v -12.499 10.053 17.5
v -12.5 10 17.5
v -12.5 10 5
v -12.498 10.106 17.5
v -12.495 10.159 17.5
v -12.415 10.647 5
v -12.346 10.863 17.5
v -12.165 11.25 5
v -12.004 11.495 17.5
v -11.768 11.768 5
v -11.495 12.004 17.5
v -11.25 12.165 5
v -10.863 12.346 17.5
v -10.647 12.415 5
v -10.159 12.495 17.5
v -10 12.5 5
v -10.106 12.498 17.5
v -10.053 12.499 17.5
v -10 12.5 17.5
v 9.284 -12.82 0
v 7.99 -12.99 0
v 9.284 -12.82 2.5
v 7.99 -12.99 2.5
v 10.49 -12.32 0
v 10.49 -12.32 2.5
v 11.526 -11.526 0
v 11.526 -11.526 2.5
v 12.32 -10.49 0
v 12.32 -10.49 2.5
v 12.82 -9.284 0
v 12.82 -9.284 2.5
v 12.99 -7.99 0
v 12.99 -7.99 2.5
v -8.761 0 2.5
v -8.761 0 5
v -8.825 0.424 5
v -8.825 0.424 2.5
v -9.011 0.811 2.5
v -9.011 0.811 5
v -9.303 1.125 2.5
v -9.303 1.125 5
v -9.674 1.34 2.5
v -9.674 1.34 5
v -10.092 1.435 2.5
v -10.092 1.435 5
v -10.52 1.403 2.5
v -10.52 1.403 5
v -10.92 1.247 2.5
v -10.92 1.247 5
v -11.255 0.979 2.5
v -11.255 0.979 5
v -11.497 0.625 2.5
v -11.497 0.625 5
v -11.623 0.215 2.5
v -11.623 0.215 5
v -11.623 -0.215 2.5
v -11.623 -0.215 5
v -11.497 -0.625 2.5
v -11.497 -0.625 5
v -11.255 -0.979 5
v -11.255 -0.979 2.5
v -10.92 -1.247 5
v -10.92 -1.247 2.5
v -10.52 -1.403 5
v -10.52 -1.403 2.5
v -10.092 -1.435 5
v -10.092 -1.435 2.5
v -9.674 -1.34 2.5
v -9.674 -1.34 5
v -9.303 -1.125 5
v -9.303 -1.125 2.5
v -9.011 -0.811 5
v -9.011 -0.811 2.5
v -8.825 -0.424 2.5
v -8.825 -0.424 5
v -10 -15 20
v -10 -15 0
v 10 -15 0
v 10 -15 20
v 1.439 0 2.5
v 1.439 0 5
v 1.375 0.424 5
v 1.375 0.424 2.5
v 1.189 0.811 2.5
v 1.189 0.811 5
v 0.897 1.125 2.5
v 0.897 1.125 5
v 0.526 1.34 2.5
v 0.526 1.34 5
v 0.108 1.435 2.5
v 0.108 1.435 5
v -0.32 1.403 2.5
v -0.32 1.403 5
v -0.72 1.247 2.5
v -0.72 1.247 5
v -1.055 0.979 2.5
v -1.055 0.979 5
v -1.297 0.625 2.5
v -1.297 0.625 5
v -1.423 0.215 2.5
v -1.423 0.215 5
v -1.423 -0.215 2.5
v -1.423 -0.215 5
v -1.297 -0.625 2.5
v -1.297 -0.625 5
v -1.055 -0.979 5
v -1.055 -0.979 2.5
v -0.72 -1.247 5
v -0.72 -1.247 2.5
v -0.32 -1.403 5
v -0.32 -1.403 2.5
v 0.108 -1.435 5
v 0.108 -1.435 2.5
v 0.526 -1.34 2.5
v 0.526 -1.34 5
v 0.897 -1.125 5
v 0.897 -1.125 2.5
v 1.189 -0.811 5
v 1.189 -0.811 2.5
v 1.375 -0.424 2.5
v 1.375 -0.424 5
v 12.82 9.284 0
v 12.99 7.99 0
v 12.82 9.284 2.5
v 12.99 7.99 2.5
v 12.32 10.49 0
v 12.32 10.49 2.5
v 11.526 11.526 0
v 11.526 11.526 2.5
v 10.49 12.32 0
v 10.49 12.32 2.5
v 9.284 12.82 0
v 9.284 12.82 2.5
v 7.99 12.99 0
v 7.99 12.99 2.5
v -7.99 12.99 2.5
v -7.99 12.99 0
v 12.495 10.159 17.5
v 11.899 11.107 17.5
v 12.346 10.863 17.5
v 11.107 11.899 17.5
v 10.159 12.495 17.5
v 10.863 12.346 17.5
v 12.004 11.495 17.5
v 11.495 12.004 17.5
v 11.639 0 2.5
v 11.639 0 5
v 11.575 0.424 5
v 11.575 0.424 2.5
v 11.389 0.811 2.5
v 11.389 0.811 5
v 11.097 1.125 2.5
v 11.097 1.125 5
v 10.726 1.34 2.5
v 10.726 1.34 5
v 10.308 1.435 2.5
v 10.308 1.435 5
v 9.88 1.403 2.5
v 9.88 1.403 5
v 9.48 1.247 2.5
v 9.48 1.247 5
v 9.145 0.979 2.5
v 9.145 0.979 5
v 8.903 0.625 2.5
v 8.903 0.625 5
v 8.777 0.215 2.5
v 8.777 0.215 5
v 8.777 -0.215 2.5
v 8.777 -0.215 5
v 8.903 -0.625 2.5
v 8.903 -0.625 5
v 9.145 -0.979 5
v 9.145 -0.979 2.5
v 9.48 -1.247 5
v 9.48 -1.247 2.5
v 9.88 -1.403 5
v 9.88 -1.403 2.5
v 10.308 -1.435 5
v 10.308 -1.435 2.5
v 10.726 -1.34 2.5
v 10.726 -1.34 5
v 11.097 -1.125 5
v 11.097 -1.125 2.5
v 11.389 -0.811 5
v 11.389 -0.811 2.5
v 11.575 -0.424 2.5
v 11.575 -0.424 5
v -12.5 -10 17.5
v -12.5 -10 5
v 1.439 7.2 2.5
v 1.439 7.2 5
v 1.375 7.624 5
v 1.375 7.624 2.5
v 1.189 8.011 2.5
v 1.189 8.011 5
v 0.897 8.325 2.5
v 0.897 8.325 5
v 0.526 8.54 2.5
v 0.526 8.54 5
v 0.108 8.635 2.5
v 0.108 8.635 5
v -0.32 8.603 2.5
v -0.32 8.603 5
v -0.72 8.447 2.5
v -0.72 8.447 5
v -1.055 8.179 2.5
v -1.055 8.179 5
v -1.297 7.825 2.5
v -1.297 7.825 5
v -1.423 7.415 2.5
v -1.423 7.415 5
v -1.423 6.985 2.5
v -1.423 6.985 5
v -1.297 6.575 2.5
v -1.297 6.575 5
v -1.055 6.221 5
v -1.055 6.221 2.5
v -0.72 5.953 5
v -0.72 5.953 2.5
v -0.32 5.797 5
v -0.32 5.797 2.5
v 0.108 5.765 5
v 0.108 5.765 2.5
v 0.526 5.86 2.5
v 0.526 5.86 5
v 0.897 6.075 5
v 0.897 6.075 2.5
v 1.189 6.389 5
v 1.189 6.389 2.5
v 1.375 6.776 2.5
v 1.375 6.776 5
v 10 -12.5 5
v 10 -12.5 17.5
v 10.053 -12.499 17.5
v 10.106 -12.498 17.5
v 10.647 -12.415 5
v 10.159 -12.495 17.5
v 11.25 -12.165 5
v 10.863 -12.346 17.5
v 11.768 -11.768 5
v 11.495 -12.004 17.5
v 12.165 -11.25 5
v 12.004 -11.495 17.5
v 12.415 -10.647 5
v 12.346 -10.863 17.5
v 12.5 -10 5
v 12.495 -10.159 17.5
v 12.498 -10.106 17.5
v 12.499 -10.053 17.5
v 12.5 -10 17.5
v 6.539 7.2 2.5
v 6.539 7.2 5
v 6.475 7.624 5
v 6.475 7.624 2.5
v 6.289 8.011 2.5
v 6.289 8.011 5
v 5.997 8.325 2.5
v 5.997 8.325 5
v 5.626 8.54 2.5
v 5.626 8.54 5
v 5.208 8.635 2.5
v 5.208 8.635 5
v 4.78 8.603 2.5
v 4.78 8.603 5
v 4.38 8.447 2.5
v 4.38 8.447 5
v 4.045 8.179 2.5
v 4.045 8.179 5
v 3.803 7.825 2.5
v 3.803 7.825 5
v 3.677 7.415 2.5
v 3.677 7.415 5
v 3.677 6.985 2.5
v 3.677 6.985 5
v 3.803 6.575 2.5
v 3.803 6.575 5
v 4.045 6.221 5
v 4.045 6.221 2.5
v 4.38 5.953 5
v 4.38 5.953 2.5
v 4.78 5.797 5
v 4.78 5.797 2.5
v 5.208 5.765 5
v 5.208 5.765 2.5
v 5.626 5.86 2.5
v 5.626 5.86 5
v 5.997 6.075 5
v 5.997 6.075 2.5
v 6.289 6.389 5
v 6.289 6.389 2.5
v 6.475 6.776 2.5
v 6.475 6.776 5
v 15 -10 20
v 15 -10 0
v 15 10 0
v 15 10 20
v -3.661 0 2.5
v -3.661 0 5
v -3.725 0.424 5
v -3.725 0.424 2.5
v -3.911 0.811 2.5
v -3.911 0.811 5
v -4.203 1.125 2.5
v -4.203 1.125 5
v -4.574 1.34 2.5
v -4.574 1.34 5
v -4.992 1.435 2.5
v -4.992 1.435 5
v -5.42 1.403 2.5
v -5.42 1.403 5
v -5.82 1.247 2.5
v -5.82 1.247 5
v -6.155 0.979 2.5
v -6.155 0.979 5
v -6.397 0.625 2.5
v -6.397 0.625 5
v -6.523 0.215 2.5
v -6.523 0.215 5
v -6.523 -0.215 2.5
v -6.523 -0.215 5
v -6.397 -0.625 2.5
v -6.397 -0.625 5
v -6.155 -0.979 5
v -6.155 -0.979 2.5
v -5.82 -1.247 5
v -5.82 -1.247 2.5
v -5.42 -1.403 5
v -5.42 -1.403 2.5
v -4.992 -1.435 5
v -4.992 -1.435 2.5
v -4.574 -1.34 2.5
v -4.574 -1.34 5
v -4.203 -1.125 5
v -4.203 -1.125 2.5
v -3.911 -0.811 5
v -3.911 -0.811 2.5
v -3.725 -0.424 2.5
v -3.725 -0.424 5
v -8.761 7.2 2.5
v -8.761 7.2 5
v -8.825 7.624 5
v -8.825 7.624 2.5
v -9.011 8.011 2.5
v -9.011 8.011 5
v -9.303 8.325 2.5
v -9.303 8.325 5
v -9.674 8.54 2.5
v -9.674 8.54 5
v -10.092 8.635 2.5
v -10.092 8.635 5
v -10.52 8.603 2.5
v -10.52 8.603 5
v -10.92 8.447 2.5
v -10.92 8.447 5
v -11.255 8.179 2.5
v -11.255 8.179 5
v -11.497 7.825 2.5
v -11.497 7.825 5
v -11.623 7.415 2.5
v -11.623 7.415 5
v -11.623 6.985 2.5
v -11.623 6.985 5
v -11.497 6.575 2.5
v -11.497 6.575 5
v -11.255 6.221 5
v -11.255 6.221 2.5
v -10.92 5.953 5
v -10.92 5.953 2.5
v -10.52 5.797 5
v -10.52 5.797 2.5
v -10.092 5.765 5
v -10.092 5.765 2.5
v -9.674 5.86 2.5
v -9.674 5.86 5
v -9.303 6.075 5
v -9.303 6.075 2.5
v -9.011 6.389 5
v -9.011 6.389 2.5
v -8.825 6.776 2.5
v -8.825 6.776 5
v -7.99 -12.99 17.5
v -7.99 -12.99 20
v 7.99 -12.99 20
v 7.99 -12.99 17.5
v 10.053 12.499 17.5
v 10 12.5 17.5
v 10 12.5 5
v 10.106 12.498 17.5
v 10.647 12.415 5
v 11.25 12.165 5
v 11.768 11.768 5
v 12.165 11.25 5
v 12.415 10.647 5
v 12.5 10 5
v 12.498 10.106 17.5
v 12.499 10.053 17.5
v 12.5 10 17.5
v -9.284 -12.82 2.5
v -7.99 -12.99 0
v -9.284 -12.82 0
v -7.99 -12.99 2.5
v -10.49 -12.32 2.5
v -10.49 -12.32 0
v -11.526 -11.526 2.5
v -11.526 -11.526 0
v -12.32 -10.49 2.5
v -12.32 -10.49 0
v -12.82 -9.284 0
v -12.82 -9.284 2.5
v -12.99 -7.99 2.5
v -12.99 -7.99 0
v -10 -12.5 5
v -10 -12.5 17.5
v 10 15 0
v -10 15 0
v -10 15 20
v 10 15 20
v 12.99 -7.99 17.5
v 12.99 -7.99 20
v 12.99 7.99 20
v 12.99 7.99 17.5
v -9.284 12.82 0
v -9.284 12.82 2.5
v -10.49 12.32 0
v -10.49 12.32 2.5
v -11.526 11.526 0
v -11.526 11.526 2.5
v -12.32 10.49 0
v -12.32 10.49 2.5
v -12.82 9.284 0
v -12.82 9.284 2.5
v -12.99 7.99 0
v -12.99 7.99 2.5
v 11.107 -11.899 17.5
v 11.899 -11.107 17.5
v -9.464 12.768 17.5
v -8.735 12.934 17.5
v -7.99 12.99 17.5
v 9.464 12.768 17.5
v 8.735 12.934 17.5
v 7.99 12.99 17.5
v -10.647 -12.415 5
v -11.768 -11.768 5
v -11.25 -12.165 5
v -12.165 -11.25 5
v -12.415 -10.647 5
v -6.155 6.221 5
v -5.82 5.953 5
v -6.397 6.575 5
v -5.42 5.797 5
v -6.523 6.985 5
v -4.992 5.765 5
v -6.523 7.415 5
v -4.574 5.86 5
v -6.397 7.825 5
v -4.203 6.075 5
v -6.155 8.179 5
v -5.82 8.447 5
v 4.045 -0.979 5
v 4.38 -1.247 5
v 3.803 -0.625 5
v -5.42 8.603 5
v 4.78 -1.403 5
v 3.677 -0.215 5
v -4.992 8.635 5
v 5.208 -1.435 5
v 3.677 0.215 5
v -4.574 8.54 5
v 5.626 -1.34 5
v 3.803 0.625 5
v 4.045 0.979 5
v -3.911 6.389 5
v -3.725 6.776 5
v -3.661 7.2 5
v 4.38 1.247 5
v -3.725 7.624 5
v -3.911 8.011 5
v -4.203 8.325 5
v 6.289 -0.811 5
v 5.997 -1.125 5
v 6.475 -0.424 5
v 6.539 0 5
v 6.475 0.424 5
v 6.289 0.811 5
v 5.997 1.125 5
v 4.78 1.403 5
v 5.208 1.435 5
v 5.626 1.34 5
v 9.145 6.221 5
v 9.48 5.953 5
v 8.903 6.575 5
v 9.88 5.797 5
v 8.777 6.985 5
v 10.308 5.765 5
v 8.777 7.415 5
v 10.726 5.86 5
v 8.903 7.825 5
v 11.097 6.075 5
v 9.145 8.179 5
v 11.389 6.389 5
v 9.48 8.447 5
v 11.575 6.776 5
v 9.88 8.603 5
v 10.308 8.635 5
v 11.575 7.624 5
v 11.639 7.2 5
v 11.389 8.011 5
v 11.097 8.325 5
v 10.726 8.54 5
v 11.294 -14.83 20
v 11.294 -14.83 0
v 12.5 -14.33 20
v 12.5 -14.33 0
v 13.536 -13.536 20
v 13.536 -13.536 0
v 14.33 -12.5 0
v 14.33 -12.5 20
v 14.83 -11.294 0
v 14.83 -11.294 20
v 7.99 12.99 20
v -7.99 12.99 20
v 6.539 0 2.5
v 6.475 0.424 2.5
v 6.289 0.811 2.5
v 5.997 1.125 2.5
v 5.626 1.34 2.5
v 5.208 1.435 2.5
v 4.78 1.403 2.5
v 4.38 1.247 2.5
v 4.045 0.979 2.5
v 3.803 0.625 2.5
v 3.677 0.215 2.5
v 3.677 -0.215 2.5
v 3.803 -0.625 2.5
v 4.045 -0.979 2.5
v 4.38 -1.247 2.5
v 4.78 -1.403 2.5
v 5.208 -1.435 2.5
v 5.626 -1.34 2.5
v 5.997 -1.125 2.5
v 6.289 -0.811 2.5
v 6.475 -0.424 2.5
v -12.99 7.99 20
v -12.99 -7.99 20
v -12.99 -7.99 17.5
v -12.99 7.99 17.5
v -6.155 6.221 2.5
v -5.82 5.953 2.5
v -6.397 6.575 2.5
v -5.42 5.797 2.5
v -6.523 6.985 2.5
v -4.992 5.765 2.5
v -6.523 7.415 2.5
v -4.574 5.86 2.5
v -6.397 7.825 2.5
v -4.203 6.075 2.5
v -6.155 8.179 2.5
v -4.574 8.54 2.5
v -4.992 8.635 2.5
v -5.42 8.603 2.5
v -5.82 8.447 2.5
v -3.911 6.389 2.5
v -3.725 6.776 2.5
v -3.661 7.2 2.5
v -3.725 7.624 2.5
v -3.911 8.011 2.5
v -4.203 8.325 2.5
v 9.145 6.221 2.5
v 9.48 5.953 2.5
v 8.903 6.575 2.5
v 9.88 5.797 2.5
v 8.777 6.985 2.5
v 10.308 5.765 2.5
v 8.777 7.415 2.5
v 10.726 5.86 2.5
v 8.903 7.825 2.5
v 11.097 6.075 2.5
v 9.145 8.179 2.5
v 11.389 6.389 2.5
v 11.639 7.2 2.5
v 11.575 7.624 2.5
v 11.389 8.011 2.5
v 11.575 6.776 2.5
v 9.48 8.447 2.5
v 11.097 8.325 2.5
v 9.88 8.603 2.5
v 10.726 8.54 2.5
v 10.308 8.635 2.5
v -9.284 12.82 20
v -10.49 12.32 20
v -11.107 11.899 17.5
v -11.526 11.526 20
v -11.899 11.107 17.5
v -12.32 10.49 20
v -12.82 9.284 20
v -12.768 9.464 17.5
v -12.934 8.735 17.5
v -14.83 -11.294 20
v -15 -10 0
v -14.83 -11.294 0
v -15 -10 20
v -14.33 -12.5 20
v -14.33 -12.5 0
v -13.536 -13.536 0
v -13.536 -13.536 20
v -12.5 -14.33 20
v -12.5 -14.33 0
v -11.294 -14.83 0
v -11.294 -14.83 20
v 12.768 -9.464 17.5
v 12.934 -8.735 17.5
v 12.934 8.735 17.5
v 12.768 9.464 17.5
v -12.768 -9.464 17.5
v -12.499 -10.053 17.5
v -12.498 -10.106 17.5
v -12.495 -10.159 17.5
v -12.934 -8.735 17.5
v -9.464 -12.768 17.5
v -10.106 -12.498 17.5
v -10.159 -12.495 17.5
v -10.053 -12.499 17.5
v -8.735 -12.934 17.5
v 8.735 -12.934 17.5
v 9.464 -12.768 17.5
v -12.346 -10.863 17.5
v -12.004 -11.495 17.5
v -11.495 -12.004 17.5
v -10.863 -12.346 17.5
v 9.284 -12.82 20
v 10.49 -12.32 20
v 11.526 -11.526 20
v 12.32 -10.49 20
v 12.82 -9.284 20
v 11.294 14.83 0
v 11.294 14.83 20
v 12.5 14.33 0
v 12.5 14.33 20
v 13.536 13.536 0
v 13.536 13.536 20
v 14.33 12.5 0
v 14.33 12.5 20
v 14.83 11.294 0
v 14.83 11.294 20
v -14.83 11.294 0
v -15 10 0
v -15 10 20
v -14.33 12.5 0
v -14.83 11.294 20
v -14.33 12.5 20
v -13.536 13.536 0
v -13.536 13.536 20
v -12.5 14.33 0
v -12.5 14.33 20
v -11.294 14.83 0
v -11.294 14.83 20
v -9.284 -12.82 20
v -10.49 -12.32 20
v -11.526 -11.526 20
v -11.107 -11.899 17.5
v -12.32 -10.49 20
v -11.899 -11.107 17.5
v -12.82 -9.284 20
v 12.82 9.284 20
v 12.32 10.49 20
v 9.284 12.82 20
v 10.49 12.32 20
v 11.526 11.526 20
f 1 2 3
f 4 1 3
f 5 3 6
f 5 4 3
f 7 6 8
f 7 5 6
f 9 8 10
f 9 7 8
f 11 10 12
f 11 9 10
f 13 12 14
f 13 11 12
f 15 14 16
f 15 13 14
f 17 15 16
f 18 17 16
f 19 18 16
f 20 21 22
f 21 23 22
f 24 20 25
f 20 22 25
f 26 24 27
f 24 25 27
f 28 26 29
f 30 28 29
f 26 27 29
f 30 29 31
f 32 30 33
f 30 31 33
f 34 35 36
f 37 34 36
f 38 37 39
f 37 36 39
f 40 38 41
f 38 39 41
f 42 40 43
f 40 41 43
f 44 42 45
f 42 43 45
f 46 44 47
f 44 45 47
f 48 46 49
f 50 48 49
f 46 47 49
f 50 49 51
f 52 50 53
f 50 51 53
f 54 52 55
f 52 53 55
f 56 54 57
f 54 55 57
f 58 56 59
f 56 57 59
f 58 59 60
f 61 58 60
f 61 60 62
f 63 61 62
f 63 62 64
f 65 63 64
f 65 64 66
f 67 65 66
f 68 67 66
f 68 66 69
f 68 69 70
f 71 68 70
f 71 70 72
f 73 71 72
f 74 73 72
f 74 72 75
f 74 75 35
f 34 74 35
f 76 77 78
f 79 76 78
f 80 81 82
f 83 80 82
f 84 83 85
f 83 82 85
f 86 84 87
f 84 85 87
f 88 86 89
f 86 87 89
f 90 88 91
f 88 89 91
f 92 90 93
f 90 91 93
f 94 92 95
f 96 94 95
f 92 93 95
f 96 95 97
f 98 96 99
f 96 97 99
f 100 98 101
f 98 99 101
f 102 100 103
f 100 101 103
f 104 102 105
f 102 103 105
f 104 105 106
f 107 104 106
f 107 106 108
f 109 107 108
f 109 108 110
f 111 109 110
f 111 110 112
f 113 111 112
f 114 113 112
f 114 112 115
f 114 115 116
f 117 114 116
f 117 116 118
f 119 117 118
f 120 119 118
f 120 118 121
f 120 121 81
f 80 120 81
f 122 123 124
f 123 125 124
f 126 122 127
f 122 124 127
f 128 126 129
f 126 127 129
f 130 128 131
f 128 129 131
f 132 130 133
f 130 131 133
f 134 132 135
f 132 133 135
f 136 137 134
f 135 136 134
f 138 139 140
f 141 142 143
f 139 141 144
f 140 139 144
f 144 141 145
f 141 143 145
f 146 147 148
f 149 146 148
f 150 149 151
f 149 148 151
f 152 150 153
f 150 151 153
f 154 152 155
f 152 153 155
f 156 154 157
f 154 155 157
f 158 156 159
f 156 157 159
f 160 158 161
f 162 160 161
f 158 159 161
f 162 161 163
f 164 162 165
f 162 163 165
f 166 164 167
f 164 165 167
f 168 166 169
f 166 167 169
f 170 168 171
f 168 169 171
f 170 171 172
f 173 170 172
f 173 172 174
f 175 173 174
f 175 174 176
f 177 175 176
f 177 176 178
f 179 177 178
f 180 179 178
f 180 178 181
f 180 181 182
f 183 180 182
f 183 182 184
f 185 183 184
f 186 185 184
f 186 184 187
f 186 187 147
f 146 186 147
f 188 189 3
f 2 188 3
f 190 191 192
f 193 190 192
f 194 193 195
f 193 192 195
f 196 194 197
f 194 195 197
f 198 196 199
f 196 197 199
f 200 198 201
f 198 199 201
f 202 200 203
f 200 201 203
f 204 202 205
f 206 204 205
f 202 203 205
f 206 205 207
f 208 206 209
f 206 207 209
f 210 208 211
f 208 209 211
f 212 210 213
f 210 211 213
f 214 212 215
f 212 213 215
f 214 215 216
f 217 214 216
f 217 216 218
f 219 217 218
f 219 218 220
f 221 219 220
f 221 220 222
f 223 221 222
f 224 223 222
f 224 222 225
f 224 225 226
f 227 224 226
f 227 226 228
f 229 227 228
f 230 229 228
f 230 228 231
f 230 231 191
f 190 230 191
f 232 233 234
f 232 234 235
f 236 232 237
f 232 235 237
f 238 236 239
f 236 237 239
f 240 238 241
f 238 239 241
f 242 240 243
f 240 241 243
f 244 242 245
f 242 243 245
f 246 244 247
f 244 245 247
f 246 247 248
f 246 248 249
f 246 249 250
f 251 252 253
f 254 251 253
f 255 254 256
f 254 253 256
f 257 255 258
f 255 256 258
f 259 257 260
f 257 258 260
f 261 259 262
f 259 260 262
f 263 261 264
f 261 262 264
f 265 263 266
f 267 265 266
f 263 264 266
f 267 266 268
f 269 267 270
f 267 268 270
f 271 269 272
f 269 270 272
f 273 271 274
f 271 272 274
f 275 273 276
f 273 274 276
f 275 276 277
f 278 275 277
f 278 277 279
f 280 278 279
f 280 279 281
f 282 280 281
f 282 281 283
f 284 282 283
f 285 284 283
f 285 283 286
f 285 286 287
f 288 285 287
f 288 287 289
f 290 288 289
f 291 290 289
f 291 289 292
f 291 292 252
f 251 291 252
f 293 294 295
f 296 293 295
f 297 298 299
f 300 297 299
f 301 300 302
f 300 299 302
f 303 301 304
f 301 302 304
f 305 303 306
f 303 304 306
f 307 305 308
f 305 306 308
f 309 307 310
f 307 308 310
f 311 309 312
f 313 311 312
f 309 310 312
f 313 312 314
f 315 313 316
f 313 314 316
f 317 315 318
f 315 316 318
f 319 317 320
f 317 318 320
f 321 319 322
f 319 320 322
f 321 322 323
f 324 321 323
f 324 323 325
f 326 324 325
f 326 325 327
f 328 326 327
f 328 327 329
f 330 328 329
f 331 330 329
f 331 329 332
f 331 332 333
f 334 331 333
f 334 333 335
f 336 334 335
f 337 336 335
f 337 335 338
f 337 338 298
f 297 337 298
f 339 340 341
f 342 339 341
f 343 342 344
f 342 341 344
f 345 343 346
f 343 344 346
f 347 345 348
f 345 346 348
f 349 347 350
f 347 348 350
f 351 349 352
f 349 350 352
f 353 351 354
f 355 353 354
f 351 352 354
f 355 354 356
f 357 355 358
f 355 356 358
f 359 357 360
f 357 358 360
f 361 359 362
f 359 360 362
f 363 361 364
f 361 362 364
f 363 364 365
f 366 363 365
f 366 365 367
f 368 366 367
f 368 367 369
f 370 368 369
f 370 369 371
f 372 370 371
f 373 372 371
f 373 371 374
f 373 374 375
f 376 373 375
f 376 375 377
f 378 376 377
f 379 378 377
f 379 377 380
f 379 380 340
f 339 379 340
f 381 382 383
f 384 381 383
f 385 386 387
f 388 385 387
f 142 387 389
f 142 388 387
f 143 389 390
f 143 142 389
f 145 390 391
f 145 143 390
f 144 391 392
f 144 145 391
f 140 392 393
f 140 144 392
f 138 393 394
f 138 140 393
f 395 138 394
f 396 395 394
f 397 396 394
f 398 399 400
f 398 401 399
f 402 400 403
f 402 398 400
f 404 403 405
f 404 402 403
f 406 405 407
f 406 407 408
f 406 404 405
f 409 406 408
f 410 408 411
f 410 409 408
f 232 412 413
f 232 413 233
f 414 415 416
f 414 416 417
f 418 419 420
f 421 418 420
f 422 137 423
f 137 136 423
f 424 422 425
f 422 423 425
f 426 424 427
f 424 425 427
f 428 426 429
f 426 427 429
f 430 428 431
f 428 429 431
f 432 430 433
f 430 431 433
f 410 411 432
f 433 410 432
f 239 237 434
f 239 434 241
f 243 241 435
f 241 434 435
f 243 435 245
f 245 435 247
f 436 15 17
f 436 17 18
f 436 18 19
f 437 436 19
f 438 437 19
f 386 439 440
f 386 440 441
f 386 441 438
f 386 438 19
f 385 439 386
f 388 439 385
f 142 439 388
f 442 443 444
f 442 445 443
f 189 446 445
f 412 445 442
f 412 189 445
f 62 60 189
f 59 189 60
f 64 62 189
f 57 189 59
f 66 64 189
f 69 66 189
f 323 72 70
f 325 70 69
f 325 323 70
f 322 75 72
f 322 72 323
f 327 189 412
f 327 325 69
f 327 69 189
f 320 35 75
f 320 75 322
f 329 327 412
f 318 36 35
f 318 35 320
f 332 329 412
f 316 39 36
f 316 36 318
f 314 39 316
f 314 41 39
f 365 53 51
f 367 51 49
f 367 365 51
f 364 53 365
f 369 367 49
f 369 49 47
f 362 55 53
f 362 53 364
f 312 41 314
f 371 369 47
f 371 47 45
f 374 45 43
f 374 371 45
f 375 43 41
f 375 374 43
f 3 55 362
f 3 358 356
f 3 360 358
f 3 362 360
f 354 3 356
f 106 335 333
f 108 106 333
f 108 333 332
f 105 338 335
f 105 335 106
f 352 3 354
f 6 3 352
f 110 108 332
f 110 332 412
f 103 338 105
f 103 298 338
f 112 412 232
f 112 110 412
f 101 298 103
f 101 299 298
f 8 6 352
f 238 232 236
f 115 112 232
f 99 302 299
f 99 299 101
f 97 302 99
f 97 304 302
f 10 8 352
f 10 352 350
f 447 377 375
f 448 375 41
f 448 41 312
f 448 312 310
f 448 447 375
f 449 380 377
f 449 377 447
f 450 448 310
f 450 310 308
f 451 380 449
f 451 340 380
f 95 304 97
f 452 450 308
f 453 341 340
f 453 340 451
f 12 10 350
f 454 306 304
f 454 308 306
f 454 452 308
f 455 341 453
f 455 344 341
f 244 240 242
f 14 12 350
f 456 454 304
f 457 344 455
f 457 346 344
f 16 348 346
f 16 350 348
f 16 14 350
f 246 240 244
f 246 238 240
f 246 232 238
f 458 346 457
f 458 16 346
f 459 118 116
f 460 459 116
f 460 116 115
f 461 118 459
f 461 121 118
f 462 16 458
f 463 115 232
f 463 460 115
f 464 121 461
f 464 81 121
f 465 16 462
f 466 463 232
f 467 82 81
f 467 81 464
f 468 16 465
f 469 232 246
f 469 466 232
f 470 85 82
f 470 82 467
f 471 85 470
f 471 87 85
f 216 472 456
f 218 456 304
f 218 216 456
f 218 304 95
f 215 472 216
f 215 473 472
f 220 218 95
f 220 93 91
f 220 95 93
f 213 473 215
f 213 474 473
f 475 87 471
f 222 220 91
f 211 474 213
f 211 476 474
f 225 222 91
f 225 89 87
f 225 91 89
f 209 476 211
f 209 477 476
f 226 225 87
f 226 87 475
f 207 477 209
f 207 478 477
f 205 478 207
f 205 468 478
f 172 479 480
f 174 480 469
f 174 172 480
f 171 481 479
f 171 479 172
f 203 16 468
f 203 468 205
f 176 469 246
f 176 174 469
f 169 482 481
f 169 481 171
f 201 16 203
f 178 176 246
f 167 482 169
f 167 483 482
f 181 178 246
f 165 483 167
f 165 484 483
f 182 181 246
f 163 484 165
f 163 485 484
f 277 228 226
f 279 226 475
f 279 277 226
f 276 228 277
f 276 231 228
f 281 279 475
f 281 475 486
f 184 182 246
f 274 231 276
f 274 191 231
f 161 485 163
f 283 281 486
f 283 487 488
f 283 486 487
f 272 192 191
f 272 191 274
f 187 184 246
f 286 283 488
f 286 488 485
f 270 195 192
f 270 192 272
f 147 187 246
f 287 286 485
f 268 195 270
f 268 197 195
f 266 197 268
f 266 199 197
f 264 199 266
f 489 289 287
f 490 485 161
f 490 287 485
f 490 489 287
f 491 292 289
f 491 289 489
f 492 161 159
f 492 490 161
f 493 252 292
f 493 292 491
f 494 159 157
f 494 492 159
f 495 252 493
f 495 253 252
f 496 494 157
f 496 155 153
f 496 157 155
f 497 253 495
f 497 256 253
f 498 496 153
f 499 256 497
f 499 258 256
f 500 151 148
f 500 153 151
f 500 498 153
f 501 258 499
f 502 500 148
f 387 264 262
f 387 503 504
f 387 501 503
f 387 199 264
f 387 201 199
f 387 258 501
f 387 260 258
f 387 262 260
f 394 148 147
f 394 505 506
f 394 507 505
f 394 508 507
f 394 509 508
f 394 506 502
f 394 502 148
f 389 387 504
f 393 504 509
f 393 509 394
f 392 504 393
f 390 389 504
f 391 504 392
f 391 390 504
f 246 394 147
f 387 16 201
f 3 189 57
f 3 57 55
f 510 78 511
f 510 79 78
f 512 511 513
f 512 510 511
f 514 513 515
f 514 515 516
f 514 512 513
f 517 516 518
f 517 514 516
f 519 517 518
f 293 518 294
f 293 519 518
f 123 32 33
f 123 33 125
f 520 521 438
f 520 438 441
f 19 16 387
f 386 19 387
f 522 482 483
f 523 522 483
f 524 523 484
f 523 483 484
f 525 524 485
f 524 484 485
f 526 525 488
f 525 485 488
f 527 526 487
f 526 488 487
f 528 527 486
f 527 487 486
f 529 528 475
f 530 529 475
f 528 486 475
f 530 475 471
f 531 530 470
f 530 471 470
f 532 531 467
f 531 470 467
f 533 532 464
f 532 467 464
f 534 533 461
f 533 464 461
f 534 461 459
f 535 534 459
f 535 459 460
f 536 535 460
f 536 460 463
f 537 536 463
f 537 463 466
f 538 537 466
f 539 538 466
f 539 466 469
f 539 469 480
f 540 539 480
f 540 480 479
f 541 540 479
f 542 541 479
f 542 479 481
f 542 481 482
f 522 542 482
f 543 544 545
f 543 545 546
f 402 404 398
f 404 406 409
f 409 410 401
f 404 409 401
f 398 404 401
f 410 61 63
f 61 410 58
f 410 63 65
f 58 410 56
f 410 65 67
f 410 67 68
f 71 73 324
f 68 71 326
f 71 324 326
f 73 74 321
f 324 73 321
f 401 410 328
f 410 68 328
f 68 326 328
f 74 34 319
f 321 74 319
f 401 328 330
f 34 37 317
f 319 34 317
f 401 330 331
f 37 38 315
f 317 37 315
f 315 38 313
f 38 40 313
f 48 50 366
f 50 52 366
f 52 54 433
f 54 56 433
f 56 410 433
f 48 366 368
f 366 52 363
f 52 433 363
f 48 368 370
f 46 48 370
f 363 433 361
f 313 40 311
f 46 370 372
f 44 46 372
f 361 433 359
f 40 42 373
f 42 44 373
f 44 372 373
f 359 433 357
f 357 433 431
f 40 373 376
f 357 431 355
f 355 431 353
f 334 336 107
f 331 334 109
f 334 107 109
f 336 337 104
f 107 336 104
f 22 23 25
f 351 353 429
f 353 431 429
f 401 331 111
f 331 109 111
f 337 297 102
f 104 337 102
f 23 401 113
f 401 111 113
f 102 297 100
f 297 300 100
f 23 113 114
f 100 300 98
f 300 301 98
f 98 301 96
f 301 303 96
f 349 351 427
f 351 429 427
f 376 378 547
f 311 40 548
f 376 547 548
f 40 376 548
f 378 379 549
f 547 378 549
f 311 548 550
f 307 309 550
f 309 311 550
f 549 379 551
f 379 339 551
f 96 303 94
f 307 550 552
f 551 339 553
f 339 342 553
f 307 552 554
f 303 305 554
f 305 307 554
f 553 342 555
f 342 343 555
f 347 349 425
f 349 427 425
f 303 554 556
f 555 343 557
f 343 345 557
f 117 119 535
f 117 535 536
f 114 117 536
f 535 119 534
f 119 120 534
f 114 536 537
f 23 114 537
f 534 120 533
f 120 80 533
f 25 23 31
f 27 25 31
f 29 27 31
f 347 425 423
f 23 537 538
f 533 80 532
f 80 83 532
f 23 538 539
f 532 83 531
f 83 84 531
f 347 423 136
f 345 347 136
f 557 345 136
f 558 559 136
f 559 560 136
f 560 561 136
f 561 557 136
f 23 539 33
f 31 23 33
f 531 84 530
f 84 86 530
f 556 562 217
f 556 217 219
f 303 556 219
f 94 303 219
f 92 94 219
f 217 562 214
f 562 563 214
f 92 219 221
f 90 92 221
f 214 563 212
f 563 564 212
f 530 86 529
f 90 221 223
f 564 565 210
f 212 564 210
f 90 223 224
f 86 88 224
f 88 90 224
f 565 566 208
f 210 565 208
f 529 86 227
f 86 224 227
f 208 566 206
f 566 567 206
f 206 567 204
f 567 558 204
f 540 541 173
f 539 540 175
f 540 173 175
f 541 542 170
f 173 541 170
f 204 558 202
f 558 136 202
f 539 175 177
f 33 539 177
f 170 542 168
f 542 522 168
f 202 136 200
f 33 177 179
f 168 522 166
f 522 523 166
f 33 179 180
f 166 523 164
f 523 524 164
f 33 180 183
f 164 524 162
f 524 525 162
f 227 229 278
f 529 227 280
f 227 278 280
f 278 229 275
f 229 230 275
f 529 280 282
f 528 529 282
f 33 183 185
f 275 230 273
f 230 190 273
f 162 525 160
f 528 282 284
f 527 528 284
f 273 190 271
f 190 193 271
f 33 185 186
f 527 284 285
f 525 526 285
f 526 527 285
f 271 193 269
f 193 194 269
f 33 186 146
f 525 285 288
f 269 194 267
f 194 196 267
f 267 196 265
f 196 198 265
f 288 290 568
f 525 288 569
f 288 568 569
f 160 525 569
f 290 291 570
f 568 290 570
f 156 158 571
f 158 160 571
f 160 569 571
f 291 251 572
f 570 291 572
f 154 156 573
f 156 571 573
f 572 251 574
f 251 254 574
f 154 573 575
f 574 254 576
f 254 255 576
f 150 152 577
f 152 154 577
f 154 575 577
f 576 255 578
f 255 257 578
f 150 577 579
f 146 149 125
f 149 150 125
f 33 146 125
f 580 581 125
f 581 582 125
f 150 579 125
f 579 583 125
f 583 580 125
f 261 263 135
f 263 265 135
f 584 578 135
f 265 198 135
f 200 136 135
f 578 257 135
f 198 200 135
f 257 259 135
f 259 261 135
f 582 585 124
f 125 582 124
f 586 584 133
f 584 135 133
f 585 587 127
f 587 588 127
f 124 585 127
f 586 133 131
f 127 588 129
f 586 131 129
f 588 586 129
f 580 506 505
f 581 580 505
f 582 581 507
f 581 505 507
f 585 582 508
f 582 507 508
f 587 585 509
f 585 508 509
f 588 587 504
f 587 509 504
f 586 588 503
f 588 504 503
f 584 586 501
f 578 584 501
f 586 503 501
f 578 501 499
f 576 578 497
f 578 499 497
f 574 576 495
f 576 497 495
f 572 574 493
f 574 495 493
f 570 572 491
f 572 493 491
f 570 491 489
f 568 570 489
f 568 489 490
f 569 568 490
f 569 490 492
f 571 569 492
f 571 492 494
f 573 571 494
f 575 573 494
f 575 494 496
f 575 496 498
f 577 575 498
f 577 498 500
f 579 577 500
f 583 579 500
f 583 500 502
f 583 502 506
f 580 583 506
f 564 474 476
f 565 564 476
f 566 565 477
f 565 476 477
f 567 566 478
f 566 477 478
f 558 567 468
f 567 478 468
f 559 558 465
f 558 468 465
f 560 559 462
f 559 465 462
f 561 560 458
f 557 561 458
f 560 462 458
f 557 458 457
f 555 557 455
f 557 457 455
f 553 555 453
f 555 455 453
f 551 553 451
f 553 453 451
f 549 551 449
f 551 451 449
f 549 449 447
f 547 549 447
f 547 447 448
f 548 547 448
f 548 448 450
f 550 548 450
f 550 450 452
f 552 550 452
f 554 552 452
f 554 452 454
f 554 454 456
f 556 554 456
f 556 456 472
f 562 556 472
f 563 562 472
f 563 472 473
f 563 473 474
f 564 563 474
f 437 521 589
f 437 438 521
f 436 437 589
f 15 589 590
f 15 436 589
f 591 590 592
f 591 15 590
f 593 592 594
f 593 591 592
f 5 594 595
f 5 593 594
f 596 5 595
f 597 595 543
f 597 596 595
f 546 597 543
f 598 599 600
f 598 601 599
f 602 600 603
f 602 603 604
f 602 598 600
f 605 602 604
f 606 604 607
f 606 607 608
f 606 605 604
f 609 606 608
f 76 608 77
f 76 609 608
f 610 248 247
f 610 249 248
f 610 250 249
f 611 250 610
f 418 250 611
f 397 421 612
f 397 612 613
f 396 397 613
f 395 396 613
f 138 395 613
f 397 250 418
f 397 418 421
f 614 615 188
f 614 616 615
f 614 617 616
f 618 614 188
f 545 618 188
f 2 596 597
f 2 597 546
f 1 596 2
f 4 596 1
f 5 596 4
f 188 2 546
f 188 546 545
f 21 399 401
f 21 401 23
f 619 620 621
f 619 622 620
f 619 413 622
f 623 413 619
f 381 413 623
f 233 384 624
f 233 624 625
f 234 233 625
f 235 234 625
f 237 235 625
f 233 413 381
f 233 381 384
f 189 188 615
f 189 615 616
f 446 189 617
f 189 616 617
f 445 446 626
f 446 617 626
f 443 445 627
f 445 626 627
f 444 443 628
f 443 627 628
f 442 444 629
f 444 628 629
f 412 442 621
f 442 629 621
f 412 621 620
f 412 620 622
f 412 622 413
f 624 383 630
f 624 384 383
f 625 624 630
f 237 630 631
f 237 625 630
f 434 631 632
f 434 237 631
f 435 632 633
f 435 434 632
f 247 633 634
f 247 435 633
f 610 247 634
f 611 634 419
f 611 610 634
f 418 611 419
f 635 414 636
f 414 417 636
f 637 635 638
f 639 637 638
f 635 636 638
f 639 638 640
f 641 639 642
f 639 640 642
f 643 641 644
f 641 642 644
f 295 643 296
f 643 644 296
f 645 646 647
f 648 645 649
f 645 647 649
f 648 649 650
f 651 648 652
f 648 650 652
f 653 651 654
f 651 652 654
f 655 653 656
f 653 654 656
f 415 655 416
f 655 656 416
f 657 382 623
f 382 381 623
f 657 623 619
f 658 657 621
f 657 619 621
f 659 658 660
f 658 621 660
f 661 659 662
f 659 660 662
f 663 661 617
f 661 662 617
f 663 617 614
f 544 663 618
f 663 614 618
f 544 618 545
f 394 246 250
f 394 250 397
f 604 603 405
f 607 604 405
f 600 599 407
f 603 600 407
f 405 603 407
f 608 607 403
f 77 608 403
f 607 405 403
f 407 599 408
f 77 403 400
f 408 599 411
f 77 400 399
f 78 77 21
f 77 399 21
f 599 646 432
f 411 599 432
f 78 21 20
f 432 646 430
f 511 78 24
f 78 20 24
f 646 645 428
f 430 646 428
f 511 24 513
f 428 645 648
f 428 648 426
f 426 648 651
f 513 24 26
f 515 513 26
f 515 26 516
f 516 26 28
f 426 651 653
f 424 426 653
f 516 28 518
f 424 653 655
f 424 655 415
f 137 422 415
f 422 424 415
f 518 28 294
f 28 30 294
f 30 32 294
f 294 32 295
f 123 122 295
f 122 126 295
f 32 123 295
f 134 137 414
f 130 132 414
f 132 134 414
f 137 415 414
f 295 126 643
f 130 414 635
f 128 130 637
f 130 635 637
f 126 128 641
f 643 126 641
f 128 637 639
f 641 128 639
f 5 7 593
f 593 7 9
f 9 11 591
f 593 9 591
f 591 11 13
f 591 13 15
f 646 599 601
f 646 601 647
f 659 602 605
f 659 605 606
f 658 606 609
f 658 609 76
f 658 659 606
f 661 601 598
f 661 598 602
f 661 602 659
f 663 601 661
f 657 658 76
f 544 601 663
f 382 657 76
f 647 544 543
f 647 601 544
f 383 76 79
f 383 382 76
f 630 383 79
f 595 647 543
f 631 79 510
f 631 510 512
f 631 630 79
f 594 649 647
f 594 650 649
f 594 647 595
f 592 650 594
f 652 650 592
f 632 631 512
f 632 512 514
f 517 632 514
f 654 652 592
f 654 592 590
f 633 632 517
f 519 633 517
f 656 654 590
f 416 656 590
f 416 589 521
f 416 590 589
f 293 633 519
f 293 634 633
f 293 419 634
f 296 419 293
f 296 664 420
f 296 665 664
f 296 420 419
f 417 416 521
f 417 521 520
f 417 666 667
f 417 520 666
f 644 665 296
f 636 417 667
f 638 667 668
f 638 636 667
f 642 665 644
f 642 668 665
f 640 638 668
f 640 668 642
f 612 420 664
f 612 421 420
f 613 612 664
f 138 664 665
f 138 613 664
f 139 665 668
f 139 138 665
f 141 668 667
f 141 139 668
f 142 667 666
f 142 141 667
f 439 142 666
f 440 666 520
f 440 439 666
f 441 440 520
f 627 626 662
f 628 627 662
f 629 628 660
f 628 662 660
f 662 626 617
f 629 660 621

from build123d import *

# Parameters (mm, degrees)
F0_W         = 30
F0_H         = 30
F1_DEPTH     = 20
F2_W         = 25.9800008498
F2_H         = 25.9800008498
F3_DEPTH     = 2.5
F4_W         = 25.9800008498
F4_H         = 25.9800008498
F5_DEPTH     = 2.5
F6_R         = 5
F7_T         = 2.5
F7_T3_DEPTH  = 20.9800008498
F7_T5_DEPTH  = 20.9800008498
F7_T8_ANGLE  = 90.000000001
F7_T10_ANGLE = 90.000000001
F7_T12_ANGLE = 90.000000001
F7_T14_ANGLE = 90.000000001
F8_R         = 1.4393768416
F9_DEPTH     = 25


# Not quite as in the source:
# - a shell that OpenCascade refuses in one call is made with other operations: the cavity is built on its own and cut out


with BuildPart() as f1:
    # F0 (on Top) → F1 (new body)
    with BuildSketch(Plane.XY):
        Rectangle(F0_W, F0_H)
    extrude(amount=F1_DEPTH)

    # F2 (on face) → F3 (cut)
    with BuildSketch(Plane.XY):
        Rectangle(F2_W, F2_H)
    extrude(amount=F3_DEPTH, mode=Mode.SUBTRACT)

    # F4 (on face) → F5 (cut)
    with BuildSketch(Plane.XY.offset(20)):
        Rectangle(F4_W, F4_H)
    extrude(amount=-F5_DEPTH, mode=Mode.SUBTRACT)

    # F6
    f6_edges = [f1.edges().sort_by_distance(p)[0] for p in [
        (-15, -15, 10),
        (-12.99, -12.99, 18.75),
        (-12.99, 12.99, 18.75),
        (12.99, -12.99, 18.75),
        (15, -15, 10),
        (15, 15, 10),
        (-15, 15, 10),
        (12.99, 12.99, 18.75),
        (-12.99, 12.99, 1.25),
        (12.99, -12.99, 1.25),
        (-12.99, -12.99, 1.25),
        (12.99, 12.99, 1.25),
    ]]
    fillet(f6_edges, radius=F6_R)

    # F7: shell of thickness 2.5, made by hand


with BuildPart() as f7_core1:
    # F7_t2: copy of F1
    add(f1.part)

    # the walls: a layer under each face that stays
    f7_faces = [f7_core1.faces().sort_by_distance(p)[0] for p in [
        (0, 15, 10),
        (-12.8571428571, -12.8571428571, 0),
        (13.5355339059, 13.5355339059, 10),
        (-13.5355339059, 13.5355339059, 10),
        (-12.8571428571, -12.8571428571, 20),
        (15, 0, 10),
        (-15, 0, 10),
        (13.5355339059, -13.5355339059, 10),
        (-13.5355339059, -13.5355339059, 10),
        (0, -15, 10),
        (-12.9900004249, 0, 1.25),
        (-11.5255343308, 11.5255343308, 1.25),
        (-11.5255343308, -11.5255343308, 1.25),
        (0, 12.9900004249, 1.25),
        (0, -12.9900004249, 1.25),
        (11.5255343308, 11.5255343308, 1.25),
        (11.5255343308, -11.5255343308, 1.25),
        (12.9900004249, 0, 1.25),
        (0, 12.9900004249, 18.75),
        (11.5255343308, 11.5255343308, 18.75),
        (-11.5255343308, 11.5255343308, 18.75),
        (12.9900004249, 0, 18.75),
        (-12.9900004249, 0, 18.75),
        (11.5255343308, -11.5255343308, 18.75),
        (-11.5255343308, -11.5255343308, 18.75),
        (0, -12.9900004249, 18.75),
        (0, 0, 2.5),
    ]]
    thicken(f7_faces, amount=-F7_T, mode=Mode.SUBTRACT)

    # F7_s4 → F7_t3 (cut)
    with BuildSketch(Plane.XZ.offset(-10.4900004249)):
        Polygon((-12.9650004249, 2.475), (-15.4900004249, 2.5), (-15.4900004249, 5), (-12.9900004249, 5), align=None)
        Polygon((12.9650004249, 2.475), (15.4900004249, 2.5), (15.4900004249, 5), (12.9900004249, 5), align=None)
    extrude(amount=F7_T3_DEPTH, mode=Mode.SUBTRACT)

    # F7_s6 → F7_t5 (cut)
    with BuildSketch(Plane.YZ.offset(-10.4900004249)):
        Polygon((12.9650004249, 2.475), (15.4900004249, 2.5), (15.4900004249, 5), (12.9900004249, 5), align=None)
        Polygon((-12.9650004249, 2.475), (-15.4900004249, 2.5), (-15.4900004249, 5), (-12.9900004249, 5), align=None)
    extrude(amount=F7_T5_DEPTH, mode=Mode.SUBTRACT)

    # F7_s7 → F7_t8 (revolve, cut)
    with BuildSketch(Plane.XZ.offset(-7.9900004249)):
        Polygon((-12.9650004249, 2.475), (-15.4900004249, 2.5), (-15.4900004249, 5), (-12.9900004249, 5), align=None)
    revolve(axis=Axis((-7.9900004249, 7.9900004249, 2.5), (0, 0, -1)), revolution_arc=F7_T8_ANGLE, mode=Mode.SUBTRACT)

    # F7_s9 → F7_t10 (revolve, cut)
    with BuildSketch(Plane.XZ.offset(7.9900004249)):
        Polygon((-12.9650004249, 2.475), (-15.4900004249, 2.5), (-15.4900004249, 5), (-12.9900004249, 5), align=None)
    revolve(axis=Axis((-7.9900004249, -7.9900004249, 2.5), (0, 0, 1)), revolution_arc=F7_T10_ANGLE, mode=Mode.SUBTRACT)

    # F7_s11 → F7_t12 (revolve, cut)
    with BuildSketch(Plane.XZ.offset(-7.9900004249)):
        Polygon((12.9650004249, 2.475), (15.4900004249, 2.5), (15.4900004249, 5), (12.9900004249, 5), align=None)
    revolve(axis=Axis((7.9900004249, 7.9900004249, 2.5), (0, 0, 1)), revolution_arc=F7_T12_ANGLE, mode=Mode.SUBTRACT)

    # F7_s13 → F7_t14 (revolve, cut)
    with BuildSketch(Plane.YZ.offset(7.9900004249)):
        Polygon((-12.9650004249, 2.475), (-15.4900004249, 2.5), (-15.4900004249, 5), (-12.9900004249, 5), align=None)
    revolve(axis=Axis((7.9900004249, -7.9900004249, 2.5), (0, 0, 1)), revolution_arc=F7_T14_ANGLE, mode=Mode.SUBTRACT)


with BuildPart() as f1_1:
    add(f1.part)

    # what is left inside the walls is the cavity
    f7_cavity = [f7_core1.part.solids().sort_by_distance(p)[0] for p in [
        (0, -4.166667, 17.475),
    ]]
    add(f7_cavity, mode=Mode.SUBTRACT)

    # F8 (on face) → F9 (cut)
    with BuildSketch(Plane.XY.offset(5)):
        Circle(F8_R)
        with Locations((0, 7.2)):
            Circle(F8_R)
        with Locations((5.1, 0)):
            Circle(F8_R)
        with Locations((5.1, 7.2)):
            Circle(F8_R)
        with Locations((10.2, 0)):
            Circle(F8_R)
        with Locations((10.2, 7.2)):
            Circle(F8_R)
        with Locations((-5.1, 0)):
            Circle(F8_R)
        with Locations((-10.2, 0)):
            Circle(F8_R)
        with Locations((-10.2, 7.2)):
            Circle(F8_R)
        with Locations((-5.1, 7.2)):
            Circle(F8_R)
    extrude(amount=-F9_DEPTH, mode=Mode.SUBTRACT)


solid = f1_1.part
